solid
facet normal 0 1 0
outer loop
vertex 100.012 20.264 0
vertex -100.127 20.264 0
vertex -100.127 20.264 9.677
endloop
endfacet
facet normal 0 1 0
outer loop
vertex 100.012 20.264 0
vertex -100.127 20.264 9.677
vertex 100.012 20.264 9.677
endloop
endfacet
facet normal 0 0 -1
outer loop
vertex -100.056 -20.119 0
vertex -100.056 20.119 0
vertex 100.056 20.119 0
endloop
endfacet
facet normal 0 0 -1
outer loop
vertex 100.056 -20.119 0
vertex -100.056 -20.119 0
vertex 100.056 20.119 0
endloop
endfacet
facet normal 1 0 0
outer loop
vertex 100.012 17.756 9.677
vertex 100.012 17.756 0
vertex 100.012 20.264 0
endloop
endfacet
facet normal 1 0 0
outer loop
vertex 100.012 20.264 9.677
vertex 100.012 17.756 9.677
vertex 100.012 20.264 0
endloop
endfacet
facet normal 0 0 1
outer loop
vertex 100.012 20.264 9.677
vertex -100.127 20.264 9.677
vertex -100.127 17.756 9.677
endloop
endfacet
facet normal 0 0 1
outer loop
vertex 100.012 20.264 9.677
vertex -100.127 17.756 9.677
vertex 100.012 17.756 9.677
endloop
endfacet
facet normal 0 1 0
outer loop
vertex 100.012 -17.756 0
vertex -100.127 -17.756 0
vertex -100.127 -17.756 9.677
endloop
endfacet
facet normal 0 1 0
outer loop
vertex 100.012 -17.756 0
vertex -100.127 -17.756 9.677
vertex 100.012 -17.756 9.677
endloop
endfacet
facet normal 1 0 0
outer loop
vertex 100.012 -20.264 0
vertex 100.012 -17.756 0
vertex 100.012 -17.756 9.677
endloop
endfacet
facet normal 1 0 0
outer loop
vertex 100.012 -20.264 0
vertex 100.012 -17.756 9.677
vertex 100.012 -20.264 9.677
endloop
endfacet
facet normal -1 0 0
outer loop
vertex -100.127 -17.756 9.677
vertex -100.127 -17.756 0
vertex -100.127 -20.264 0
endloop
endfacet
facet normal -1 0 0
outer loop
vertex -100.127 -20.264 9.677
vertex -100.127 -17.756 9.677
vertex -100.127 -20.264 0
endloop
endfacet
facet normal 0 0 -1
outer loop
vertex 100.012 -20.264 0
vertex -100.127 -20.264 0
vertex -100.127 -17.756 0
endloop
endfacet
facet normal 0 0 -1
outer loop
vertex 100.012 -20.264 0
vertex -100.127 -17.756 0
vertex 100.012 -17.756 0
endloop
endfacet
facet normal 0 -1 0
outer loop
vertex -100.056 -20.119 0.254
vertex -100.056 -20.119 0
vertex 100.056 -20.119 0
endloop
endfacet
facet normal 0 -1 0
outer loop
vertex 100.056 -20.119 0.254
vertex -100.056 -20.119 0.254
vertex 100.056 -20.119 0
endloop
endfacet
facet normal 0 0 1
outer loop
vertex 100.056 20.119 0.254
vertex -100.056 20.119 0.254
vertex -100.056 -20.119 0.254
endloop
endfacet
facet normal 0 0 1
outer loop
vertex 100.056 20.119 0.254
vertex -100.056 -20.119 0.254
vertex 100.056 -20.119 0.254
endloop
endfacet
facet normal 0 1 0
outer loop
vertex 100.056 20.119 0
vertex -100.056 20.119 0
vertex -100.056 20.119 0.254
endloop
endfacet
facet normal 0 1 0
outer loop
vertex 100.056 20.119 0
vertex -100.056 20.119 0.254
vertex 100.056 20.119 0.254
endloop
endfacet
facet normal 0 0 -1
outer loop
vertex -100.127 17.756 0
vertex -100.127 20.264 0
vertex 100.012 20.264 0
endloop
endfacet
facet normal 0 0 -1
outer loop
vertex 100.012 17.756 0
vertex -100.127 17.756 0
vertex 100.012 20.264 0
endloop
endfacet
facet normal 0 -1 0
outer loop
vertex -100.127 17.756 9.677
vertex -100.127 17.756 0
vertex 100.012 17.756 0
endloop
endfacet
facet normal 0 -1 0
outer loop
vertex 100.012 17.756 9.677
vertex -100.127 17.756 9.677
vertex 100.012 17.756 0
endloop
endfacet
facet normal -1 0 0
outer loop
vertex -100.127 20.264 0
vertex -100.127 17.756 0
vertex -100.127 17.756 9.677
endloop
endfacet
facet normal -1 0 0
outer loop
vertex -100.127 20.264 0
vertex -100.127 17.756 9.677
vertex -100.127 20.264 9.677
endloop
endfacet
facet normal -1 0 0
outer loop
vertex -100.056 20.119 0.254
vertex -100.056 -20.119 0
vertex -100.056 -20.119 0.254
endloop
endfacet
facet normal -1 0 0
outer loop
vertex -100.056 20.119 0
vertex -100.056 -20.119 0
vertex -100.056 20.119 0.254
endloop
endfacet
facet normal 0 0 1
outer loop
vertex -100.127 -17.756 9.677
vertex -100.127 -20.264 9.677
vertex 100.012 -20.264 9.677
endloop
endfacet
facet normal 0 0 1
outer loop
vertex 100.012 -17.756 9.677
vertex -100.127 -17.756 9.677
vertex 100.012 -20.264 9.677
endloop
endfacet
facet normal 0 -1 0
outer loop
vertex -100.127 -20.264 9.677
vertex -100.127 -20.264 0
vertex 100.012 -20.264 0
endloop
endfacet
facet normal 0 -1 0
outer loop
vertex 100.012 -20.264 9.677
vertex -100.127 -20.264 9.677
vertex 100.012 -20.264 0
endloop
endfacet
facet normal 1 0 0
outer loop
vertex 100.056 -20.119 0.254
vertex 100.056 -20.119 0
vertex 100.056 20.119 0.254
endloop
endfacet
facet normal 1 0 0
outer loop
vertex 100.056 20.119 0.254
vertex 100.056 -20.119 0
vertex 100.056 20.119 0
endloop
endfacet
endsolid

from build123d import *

# Parameters (mm, degrees)
F1_W     = 200.1392990351
F1_H     = 2.5080107152
F2_DEPTH = 9.6774
F0_W     = 200.1125812531
F0_H     = 40.237609297
F3_DEPTH = 0.254


# Not quite as in the source:
# - a feature names something its author has since deleted; it is built from what else it names


with BuildPart() as f2:
    # F1 (on Top) → F2 (new body)
    with BuildSketch(Plane.XY):
        with Locations((-0.0575333834, 19.0099850297)):
            Rectangle(F1_W, F1_H)
    extrude(amount=F2_DEPTH)


with BuildPart() as f3:
    # F0 (on Top) → F3 (new body)
    with BuildSketch(Plane.XY):
        Rectangle(F0_W, F0_H)
    extrude(amount=F3_DEPTH)


with BuildPart() as f4_1:
    # F4: instance of F2
    add(f2.part.mirror(Plane.XZ))


solid = Compound([f2.part, f3.part, f4_1.part])
